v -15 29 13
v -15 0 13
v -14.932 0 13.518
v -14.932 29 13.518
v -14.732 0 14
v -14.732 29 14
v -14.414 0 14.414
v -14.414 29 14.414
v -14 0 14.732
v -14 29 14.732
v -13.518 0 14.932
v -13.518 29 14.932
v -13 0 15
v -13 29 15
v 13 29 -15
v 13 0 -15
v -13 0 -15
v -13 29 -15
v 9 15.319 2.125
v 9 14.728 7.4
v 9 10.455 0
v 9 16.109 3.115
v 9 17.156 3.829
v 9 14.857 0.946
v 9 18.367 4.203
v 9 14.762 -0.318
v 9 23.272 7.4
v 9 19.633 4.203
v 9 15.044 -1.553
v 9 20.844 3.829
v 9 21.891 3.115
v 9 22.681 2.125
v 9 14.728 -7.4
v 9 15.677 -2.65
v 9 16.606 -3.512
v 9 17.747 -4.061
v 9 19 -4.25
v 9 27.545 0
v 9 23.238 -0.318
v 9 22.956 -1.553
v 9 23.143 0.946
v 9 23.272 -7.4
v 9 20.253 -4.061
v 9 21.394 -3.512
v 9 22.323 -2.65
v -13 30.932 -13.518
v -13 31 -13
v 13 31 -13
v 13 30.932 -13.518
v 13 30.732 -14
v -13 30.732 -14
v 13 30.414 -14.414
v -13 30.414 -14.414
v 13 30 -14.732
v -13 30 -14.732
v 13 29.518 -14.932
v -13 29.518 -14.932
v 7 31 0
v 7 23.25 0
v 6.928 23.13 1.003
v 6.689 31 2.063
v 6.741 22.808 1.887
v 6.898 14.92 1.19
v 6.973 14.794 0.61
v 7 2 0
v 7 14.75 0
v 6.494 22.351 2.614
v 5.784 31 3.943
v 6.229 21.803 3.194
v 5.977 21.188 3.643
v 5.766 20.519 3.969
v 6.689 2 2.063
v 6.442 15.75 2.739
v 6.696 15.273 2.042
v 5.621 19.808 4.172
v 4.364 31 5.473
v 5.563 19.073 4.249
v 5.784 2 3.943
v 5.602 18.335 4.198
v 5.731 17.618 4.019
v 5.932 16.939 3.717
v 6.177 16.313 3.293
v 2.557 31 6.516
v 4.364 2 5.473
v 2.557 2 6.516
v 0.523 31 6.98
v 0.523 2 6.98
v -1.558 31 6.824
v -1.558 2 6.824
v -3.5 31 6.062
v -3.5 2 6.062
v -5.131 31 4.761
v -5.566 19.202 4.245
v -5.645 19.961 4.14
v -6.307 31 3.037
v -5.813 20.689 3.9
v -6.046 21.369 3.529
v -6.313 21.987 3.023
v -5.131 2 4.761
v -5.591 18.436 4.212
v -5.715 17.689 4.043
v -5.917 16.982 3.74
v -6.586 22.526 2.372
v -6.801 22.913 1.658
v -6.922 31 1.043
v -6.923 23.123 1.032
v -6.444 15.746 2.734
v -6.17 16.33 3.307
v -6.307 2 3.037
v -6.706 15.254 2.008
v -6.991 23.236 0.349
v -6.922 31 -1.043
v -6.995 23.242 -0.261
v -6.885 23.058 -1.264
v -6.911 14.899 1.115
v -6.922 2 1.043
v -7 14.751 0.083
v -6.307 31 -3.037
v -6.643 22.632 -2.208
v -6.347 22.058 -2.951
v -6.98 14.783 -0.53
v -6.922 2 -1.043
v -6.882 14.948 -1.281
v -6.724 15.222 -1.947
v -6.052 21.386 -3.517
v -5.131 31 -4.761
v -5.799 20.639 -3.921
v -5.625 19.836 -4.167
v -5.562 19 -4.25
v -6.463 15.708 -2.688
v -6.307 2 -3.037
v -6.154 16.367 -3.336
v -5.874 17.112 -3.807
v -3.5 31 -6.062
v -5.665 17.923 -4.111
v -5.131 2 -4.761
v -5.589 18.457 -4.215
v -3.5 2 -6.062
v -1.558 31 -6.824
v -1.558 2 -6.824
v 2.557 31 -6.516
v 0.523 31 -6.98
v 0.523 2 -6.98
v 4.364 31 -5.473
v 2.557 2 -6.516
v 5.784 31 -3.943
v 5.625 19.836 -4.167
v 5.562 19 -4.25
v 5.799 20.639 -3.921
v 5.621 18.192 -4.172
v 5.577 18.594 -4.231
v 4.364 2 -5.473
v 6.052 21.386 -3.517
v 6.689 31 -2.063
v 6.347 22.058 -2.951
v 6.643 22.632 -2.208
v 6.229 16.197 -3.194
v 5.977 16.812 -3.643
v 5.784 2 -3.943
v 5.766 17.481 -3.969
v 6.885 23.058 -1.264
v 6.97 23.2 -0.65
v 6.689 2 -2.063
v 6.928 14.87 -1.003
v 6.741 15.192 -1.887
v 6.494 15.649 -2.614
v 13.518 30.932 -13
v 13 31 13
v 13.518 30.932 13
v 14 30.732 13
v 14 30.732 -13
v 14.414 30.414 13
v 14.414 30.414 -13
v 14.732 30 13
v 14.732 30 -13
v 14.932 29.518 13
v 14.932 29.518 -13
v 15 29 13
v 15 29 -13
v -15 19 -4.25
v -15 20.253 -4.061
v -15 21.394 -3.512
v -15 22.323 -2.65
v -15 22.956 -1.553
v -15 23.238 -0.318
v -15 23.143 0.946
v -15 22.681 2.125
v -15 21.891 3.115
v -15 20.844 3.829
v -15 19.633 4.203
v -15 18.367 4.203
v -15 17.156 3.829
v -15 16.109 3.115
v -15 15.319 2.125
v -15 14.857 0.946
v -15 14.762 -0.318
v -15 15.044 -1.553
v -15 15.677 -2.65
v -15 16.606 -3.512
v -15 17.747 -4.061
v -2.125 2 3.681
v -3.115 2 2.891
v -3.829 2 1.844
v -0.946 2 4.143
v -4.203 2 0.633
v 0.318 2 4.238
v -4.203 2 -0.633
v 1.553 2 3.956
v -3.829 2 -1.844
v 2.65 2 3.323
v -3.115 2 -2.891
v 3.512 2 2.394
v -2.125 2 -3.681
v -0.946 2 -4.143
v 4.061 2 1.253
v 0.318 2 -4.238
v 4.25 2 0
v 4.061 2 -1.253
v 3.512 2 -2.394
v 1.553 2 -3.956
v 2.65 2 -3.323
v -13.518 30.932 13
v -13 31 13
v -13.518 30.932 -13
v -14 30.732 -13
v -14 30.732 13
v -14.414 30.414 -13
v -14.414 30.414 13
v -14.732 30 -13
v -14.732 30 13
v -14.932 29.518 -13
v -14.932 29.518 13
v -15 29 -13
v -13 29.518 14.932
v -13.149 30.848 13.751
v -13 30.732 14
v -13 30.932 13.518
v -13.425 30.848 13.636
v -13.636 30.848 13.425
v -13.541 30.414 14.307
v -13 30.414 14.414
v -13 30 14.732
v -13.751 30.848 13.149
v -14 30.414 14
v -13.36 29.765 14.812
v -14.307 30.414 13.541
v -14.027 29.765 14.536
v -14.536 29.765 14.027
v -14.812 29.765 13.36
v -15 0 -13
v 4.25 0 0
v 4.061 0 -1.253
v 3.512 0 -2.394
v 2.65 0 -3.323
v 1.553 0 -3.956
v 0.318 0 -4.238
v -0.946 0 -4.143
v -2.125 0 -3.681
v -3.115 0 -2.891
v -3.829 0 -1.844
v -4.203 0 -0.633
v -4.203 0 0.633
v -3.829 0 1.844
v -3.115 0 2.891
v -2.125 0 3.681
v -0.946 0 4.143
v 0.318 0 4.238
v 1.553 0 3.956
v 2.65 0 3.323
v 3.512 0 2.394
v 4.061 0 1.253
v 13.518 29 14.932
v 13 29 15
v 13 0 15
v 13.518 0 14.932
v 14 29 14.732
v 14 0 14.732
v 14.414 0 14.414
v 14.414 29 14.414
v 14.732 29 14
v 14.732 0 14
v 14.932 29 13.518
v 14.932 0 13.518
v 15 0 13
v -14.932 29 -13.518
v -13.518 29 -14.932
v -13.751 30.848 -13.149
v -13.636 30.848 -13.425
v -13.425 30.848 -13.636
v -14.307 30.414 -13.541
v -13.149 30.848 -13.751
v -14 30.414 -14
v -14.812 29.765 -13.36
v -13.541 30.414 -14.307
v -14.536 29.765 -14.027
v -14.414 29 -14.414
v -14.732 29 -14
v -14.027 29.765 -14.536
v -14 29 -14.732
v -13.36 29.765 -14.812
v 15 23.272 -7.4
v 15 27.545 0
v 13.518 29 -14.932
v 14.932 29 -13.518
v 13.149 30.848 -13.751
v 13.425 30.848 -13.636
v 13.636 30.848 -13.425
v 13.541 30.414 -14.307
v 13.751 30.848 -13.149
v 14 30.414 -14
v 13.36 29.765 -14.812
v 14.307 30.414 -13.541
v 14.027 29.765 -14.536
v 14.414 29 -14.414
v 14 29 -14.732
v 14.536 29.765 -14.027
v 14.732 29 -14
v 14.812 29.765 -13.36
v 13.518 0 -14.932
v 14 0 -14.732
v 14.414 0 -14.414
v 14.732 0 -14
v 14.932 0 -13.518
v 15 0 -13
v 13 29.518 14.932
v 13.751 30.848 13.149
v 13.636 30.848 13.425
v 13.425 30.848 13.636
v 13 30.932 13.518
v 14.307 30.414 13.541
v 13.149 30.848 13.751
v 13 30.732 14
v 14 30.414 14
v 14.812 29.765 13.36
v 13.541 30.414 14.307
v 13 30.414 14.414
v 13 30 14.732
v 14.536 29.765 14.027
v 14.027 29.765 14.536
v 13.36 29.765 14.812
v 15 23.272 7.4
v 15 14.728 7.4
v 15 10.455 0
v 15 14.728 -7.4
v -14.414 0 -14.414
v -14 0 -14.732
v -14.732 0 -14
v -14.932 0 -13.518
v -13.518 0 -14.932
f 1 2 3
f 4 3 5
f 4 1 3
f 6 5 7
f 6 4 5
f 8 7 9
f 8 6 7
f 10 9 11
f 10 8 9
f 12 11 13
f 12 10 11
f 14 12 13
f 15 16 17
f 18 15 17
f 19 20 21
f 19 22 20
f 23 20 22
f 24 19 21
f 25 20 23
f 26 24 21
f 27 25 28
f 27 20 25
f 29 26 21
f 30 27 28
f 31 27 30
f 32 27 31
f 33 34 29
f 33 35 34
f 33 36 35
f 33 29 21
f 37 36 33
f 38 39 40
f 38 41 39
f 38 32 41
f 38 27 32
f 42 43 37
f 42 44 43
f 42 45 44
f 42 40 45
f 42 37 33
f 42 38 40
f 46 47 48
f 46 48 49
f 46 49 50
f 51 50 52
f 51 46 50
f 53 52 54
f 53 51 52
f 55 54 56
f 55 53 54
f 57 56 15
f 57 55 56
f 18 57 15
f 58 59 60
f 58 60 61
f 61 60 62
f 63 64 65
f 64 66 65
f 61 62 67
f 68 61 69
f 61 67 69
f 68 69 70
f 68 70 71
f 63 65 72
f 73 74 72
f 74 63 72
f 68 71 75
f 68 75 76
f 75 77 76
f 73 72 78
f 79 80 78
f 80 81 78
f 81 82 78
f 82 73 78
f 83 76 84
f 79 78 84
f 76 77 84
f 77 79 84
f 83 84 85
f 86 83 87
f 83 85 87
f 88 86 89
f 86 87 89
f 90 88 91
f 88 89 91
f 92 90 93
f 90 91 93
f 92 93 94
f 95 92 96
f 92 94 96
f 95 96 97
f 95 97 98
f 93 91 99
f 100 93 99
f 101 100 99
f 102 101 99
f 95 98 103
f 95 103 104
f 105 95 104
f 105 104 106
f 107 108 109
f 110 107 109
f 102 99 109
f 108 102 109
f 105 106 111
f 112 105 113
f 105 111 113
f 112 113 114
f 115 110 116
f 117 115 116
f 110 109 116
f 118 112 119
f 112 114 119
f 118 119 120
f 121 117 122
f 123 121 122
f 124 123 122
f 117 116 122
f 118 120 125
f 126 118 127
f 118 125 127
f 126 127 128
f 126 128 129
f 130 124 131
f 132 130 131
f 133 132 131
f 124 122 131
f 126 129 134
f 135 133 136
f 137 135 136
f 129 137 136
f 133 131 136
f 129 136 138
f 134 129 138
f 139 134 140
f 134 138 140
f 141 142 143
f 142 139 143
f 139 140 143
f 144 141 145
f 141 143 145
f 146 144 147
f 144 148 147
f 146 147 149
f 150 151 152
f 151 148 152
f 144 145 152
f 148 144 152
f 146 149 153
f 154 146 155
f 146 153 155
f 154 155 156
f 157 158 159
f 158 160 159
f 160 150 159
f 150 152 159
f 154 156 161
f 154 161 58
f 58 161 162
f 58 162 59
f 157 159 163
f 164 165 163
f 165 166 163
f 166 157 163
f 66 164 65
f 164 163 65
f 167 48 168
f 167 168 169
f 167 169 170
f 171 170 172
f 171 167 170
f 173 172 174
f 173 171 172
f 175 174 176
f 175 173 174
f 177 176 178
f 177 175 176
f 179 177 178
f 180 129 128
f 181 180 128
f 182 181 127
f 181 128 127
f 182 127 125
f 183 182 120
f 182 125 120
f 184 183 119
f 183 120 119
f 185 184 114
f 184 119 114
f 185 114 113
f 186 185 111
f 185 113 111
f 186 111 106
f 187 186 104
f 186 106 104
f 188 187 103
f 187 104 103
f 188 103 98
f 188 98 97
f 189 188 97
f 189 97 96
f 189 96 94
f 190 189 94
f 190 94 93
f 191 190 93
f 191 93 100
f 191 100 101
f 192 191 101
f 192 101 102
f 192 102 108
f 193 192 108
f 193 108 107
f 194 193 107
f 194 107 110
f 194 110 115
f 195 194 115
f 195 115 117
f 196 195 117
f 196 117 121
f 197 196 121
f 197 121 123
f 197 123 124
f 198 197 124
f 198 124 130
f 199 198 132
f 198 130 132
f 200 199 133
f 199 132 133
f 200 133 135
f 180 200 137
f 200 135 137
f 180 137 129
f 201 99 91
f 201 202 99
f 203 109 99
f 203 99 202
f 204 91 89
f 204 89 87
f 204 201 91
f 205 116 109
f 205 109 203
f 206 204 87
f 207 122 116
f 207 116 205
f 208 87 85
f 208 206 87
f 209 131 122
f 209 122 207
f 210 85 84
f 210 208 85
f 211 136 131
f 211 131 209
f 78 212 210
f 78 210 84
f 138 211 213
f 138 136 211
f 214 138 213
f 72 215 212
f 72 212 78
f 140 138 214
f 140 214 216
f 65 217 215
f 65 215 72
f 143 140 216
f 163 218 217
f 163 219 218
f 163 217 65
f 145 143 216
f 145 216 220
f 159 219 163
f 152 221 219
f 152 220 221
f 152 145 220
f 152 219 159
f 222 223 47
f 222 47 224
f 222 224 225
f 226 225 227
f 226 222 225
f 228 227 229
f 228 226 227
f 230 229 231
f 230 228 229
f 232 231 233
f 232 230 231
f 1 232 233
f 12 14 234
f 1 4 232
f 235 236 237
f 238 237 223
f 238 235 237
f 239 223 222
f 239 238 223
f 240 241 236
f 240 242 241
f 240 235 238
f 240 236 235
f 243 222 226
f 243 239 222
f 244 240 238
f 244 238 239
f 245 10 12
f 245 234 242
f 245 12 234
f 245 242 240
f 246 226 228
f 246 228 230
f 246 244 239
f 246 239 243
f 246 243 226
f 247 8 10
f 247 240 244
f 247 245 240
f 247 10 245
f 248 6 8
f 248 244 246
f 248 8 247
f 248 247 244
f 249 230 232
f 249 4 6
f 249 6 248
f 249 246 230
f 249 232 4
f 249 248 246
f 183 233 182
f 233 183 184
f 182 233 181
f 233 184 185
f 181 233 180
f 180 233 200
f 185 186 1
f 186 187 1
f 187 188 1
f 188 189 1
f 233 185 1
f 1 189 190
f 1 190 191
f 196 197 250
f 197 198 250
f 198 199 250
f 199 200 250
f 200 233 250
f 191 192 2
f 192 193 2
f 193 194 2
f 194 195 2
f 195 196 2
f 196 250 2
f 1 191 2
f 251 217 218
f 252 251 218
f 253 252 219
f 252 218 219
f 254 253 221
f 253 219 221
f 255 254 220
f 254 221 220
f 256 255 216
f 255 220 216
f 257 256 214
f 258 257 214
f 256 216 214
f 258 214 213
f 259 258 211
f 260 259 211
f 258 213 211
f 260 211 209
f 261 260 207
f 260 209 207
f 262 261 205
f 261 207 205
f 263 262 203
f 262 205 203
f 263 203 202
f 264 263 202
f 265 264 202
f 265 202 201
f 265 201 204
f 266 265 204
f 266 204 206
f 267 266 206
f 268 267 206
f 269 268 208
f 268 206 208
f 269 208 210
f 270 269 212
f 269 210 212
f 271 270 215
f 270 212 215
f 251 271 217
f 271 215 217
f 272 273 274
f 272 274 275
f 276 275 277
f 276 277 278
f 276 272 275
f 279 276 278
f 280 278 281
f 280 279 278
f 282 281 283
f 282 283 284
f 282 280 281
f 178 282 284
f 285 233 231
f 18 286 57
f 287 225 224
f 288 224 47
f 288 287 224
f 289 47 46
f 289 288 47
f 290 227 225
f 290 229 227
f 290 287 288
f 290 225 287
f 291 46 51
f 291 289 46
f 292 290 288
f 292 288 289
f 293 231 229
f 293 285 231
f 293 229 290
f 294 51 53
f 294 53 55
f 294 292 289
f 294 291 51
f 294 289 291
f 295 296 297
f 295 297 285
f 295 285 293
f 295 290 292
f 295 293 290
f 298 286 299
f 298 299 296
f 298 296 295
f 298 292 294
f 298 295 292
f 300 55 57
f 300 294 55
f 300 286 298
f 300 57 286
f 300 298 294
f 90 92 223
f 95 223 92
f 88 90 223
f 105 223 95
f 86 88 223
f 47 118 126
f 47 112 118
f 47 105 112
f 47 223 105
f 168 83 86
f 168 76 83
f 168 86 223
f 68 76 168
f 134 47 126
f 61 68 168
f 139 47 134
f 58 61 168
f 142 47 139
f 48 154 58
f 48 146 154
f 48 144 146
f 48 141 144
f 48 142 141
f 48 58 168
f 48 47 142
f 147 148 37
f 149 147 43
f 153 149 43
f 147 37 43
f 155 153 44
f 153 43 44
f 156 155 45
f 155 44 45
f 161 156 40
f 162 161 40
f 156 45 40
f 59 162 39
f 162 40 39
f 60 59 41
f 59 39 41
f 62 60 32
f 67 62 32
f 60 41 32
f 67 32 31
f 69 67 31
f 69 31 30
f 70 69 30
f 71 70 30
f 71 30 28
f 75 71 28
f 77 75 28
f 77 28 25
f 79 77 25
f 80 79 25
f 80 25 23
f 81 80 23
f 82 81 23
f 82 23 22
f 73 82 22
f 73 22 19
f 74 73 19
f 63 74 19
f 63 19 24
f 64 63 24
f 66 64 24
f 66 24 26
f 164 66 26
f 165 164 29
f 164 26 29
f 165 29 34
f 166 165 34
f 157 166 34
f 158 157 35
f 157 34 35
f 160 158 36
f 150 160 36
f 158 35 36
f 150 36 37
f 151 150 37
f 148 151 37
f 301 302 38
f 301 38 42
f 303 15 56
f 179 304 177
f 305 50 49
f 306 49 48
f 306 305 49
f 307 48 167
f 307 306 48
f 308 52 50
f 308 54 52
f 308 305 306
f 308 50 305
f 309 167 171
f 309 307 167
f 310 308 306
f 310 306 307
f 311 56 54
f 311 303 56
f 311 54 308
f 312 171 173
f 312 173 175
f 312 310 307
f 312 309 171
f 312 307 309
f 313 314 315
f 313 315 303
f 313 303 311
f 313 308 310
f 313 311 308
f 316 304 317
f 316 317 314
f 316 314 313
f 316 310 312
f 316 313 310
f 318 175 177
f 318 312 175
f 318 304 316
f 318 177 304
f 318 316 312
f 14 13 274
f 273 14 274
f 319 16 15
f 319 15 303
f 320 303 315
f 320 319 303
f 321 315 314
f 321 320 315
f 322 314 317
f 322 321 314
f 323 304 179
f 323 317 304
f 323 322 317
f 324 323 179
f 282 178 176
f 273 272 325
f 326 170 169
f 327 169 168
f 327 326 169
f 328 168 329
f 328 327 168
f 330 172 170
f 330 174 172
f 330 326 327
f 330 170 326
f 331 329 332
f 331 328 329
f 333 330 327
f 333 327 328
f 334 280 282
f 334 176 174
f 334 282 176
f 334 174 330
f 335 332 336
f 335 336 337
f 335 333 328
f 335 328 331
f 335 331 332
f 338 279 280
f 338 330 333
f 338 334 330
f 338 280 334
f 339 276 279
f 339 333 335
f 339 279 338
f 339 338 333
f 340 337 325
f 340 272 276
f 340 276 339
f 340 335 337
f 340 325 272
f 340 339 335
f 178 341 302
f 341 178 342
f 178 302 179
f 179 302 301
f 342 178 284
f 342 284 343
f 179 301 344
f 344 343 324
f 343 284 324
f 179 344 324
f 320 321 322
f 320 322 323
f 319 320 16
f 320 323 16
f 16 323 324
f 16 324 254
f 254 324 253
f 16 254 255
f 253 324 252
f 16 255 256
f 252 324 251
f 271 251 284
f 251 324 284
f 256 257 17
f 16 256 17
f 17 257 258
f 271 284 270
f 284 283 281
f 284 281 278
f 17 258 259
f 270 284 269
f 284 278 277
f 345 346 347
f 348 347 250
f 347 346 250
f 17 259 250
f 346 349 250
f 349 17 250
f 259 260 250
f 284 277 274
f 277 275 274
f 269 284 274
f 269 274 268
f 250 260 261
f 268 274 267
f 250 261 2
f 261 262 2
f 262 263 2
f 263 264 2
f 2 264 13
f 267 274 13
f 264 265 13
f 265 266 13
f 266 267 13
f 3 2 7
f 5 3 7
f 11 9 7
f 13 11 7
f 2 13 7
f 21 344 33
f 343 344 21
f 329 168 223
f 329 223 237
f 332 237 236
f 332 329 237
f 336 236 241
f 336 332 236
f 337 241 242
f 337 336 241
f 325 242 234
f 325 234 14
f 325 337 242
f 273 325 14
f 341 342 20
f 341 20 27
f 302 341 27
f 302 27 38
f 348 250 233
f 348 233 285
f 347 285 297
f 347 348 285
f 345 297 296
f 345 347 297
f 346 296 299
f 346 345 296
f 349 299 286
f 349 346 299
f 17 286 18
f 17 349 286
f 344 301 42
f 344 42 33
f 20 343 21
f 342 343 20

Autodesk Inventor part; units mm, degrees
ref_plane "YZ Plane" through (0, 0, 0) normal (1, 0, 0) x (0, 1, 0)
ref_plane "XZ Plane" through (0, 0, 0) normal (0, 1, 0) x (-1, 0, 0)
ref_plane "XY Plane" through (0, 0, 0) normal (0, 0, 1) x (1, 0, 0)
sketch "Sketch1" plane through (0, 0, 0) normal (0, 1, 0) x (-1, 0, 0)
  line L0 (-15, 15) -> (15, 15)
  line L1 (15, 15) -> (15, -15)
  line L2 (15, -15) -> (-15, -15)
  line L3 (-15, -15) -> (-15, 15)
  line L4 (-15, 15) -> (15, -15) construction
  line L5 (15, 15) -> (-15, -15) construction
  point P0 (0, 0)
  dimension "d0" = 30
  dimension "d1" = 30
extrude "Extrusion1" add sketch "Sketch1" along normal blind 11
sketch "Sketch2" plane through (0, 11, 0) normal (0, 1, 0) x (1, 0, 0)
  circle A0 centre (0, 0) radius 7
  dimension "d4" = 14
extrude "Extrusion2" cut sketch "Sketch2" against normal blind 9
sketch "Sketch3" plane through (0, 11, 0) normal (0, 1, 0) x (1, 0, 0)
  circle A0 centre (0, 0) radius 7 projected
  line L0 (-15, -15) -> (15, -15) projected
  line L1 (15, -15) -> (15, 15) projected
  line L2 (15, 15) -> (-15, 15) projected
  line L3 (-15, 15) -> (-15, -15) projected
extrude "Extrusion3" add sketch "Sketch3" along normal blind 20
sketch "Sketch4" plane through (15, 0, 15) normal (1, 0, 0) x (0, 0, -1)
  circle A0 centre (15, 19) radius 4
  line L0 (0, 31) -> (30, 31) projected
  line L1 (15, 27.5448) -> (22.4, 23.2724)
  line L2 (22.4, 23.2724) -> (22.4, 14.7276)
  line L3 (22.4, 14.7276) -> (15, 10.4552)
  line L4 (15, 10.4552) -> (7.6, 14.7276)
  line L5 (7.6, 14.7276) -> (7.6, 23.2724)
  line L6 (7.6, 23.2724) -> (15, 27.5448)
  circle A1 centre (15, 19) radius 7.4
  point P0 (15, 0)
  dimension "d9" = 8
  dimension "d10" = 12
  dimension "d22" = 14.8
extrude "Extrusion4" cut sketch "Sketch4" against normal blind 6 contours A0 | L1 A1 L6 | L1 L2 A1 | A1 | A1 L5 L6 | L2 L3 A1 | A1 L4 L5 | L3 L4 A1
sketch "Sketch5" plane through (9, 0, 15) normal (1, 0, 0) x (0, 0, -1)
  circle A0 centre (15, 19) radius 4.25
  line L0 (0, 31) -> (30, 31) projected
  point P0 (15, 0)
  dimension "d14" = 8.5
  dimension "d20" = 12
extrude "Extrusion5" cut sketch "Sketch5" against normal through all
sketch "Sketch6" plane through (0, 2, 0) normal (0, 1, 0) x (1, 0, 0)
  circle A0 centre (0, 0) radius 4.25
  dimension "d17" = 8.5
extrude "Extrusion6" cut sketch "Sketch6" against normal through all
fillet "Fillet1" radius 2 4 edges at (15, 15.5, -15) (-15, 15.5, -15) (-15, 15.5, 15) (15, 15.5, 15)
fillet "Fillet2" radius 2 8 edges at (14.4142, 31, 14.4142) (15, 31, 0) (14.4142, 31, -14.4142) (0, 31, -15) (-14.4142, 31, -14.4142) (-15, 31, 0) (-14.4142, 31, 14.4142) (0, 31, 15)
properties part number "Spoolsupport"
